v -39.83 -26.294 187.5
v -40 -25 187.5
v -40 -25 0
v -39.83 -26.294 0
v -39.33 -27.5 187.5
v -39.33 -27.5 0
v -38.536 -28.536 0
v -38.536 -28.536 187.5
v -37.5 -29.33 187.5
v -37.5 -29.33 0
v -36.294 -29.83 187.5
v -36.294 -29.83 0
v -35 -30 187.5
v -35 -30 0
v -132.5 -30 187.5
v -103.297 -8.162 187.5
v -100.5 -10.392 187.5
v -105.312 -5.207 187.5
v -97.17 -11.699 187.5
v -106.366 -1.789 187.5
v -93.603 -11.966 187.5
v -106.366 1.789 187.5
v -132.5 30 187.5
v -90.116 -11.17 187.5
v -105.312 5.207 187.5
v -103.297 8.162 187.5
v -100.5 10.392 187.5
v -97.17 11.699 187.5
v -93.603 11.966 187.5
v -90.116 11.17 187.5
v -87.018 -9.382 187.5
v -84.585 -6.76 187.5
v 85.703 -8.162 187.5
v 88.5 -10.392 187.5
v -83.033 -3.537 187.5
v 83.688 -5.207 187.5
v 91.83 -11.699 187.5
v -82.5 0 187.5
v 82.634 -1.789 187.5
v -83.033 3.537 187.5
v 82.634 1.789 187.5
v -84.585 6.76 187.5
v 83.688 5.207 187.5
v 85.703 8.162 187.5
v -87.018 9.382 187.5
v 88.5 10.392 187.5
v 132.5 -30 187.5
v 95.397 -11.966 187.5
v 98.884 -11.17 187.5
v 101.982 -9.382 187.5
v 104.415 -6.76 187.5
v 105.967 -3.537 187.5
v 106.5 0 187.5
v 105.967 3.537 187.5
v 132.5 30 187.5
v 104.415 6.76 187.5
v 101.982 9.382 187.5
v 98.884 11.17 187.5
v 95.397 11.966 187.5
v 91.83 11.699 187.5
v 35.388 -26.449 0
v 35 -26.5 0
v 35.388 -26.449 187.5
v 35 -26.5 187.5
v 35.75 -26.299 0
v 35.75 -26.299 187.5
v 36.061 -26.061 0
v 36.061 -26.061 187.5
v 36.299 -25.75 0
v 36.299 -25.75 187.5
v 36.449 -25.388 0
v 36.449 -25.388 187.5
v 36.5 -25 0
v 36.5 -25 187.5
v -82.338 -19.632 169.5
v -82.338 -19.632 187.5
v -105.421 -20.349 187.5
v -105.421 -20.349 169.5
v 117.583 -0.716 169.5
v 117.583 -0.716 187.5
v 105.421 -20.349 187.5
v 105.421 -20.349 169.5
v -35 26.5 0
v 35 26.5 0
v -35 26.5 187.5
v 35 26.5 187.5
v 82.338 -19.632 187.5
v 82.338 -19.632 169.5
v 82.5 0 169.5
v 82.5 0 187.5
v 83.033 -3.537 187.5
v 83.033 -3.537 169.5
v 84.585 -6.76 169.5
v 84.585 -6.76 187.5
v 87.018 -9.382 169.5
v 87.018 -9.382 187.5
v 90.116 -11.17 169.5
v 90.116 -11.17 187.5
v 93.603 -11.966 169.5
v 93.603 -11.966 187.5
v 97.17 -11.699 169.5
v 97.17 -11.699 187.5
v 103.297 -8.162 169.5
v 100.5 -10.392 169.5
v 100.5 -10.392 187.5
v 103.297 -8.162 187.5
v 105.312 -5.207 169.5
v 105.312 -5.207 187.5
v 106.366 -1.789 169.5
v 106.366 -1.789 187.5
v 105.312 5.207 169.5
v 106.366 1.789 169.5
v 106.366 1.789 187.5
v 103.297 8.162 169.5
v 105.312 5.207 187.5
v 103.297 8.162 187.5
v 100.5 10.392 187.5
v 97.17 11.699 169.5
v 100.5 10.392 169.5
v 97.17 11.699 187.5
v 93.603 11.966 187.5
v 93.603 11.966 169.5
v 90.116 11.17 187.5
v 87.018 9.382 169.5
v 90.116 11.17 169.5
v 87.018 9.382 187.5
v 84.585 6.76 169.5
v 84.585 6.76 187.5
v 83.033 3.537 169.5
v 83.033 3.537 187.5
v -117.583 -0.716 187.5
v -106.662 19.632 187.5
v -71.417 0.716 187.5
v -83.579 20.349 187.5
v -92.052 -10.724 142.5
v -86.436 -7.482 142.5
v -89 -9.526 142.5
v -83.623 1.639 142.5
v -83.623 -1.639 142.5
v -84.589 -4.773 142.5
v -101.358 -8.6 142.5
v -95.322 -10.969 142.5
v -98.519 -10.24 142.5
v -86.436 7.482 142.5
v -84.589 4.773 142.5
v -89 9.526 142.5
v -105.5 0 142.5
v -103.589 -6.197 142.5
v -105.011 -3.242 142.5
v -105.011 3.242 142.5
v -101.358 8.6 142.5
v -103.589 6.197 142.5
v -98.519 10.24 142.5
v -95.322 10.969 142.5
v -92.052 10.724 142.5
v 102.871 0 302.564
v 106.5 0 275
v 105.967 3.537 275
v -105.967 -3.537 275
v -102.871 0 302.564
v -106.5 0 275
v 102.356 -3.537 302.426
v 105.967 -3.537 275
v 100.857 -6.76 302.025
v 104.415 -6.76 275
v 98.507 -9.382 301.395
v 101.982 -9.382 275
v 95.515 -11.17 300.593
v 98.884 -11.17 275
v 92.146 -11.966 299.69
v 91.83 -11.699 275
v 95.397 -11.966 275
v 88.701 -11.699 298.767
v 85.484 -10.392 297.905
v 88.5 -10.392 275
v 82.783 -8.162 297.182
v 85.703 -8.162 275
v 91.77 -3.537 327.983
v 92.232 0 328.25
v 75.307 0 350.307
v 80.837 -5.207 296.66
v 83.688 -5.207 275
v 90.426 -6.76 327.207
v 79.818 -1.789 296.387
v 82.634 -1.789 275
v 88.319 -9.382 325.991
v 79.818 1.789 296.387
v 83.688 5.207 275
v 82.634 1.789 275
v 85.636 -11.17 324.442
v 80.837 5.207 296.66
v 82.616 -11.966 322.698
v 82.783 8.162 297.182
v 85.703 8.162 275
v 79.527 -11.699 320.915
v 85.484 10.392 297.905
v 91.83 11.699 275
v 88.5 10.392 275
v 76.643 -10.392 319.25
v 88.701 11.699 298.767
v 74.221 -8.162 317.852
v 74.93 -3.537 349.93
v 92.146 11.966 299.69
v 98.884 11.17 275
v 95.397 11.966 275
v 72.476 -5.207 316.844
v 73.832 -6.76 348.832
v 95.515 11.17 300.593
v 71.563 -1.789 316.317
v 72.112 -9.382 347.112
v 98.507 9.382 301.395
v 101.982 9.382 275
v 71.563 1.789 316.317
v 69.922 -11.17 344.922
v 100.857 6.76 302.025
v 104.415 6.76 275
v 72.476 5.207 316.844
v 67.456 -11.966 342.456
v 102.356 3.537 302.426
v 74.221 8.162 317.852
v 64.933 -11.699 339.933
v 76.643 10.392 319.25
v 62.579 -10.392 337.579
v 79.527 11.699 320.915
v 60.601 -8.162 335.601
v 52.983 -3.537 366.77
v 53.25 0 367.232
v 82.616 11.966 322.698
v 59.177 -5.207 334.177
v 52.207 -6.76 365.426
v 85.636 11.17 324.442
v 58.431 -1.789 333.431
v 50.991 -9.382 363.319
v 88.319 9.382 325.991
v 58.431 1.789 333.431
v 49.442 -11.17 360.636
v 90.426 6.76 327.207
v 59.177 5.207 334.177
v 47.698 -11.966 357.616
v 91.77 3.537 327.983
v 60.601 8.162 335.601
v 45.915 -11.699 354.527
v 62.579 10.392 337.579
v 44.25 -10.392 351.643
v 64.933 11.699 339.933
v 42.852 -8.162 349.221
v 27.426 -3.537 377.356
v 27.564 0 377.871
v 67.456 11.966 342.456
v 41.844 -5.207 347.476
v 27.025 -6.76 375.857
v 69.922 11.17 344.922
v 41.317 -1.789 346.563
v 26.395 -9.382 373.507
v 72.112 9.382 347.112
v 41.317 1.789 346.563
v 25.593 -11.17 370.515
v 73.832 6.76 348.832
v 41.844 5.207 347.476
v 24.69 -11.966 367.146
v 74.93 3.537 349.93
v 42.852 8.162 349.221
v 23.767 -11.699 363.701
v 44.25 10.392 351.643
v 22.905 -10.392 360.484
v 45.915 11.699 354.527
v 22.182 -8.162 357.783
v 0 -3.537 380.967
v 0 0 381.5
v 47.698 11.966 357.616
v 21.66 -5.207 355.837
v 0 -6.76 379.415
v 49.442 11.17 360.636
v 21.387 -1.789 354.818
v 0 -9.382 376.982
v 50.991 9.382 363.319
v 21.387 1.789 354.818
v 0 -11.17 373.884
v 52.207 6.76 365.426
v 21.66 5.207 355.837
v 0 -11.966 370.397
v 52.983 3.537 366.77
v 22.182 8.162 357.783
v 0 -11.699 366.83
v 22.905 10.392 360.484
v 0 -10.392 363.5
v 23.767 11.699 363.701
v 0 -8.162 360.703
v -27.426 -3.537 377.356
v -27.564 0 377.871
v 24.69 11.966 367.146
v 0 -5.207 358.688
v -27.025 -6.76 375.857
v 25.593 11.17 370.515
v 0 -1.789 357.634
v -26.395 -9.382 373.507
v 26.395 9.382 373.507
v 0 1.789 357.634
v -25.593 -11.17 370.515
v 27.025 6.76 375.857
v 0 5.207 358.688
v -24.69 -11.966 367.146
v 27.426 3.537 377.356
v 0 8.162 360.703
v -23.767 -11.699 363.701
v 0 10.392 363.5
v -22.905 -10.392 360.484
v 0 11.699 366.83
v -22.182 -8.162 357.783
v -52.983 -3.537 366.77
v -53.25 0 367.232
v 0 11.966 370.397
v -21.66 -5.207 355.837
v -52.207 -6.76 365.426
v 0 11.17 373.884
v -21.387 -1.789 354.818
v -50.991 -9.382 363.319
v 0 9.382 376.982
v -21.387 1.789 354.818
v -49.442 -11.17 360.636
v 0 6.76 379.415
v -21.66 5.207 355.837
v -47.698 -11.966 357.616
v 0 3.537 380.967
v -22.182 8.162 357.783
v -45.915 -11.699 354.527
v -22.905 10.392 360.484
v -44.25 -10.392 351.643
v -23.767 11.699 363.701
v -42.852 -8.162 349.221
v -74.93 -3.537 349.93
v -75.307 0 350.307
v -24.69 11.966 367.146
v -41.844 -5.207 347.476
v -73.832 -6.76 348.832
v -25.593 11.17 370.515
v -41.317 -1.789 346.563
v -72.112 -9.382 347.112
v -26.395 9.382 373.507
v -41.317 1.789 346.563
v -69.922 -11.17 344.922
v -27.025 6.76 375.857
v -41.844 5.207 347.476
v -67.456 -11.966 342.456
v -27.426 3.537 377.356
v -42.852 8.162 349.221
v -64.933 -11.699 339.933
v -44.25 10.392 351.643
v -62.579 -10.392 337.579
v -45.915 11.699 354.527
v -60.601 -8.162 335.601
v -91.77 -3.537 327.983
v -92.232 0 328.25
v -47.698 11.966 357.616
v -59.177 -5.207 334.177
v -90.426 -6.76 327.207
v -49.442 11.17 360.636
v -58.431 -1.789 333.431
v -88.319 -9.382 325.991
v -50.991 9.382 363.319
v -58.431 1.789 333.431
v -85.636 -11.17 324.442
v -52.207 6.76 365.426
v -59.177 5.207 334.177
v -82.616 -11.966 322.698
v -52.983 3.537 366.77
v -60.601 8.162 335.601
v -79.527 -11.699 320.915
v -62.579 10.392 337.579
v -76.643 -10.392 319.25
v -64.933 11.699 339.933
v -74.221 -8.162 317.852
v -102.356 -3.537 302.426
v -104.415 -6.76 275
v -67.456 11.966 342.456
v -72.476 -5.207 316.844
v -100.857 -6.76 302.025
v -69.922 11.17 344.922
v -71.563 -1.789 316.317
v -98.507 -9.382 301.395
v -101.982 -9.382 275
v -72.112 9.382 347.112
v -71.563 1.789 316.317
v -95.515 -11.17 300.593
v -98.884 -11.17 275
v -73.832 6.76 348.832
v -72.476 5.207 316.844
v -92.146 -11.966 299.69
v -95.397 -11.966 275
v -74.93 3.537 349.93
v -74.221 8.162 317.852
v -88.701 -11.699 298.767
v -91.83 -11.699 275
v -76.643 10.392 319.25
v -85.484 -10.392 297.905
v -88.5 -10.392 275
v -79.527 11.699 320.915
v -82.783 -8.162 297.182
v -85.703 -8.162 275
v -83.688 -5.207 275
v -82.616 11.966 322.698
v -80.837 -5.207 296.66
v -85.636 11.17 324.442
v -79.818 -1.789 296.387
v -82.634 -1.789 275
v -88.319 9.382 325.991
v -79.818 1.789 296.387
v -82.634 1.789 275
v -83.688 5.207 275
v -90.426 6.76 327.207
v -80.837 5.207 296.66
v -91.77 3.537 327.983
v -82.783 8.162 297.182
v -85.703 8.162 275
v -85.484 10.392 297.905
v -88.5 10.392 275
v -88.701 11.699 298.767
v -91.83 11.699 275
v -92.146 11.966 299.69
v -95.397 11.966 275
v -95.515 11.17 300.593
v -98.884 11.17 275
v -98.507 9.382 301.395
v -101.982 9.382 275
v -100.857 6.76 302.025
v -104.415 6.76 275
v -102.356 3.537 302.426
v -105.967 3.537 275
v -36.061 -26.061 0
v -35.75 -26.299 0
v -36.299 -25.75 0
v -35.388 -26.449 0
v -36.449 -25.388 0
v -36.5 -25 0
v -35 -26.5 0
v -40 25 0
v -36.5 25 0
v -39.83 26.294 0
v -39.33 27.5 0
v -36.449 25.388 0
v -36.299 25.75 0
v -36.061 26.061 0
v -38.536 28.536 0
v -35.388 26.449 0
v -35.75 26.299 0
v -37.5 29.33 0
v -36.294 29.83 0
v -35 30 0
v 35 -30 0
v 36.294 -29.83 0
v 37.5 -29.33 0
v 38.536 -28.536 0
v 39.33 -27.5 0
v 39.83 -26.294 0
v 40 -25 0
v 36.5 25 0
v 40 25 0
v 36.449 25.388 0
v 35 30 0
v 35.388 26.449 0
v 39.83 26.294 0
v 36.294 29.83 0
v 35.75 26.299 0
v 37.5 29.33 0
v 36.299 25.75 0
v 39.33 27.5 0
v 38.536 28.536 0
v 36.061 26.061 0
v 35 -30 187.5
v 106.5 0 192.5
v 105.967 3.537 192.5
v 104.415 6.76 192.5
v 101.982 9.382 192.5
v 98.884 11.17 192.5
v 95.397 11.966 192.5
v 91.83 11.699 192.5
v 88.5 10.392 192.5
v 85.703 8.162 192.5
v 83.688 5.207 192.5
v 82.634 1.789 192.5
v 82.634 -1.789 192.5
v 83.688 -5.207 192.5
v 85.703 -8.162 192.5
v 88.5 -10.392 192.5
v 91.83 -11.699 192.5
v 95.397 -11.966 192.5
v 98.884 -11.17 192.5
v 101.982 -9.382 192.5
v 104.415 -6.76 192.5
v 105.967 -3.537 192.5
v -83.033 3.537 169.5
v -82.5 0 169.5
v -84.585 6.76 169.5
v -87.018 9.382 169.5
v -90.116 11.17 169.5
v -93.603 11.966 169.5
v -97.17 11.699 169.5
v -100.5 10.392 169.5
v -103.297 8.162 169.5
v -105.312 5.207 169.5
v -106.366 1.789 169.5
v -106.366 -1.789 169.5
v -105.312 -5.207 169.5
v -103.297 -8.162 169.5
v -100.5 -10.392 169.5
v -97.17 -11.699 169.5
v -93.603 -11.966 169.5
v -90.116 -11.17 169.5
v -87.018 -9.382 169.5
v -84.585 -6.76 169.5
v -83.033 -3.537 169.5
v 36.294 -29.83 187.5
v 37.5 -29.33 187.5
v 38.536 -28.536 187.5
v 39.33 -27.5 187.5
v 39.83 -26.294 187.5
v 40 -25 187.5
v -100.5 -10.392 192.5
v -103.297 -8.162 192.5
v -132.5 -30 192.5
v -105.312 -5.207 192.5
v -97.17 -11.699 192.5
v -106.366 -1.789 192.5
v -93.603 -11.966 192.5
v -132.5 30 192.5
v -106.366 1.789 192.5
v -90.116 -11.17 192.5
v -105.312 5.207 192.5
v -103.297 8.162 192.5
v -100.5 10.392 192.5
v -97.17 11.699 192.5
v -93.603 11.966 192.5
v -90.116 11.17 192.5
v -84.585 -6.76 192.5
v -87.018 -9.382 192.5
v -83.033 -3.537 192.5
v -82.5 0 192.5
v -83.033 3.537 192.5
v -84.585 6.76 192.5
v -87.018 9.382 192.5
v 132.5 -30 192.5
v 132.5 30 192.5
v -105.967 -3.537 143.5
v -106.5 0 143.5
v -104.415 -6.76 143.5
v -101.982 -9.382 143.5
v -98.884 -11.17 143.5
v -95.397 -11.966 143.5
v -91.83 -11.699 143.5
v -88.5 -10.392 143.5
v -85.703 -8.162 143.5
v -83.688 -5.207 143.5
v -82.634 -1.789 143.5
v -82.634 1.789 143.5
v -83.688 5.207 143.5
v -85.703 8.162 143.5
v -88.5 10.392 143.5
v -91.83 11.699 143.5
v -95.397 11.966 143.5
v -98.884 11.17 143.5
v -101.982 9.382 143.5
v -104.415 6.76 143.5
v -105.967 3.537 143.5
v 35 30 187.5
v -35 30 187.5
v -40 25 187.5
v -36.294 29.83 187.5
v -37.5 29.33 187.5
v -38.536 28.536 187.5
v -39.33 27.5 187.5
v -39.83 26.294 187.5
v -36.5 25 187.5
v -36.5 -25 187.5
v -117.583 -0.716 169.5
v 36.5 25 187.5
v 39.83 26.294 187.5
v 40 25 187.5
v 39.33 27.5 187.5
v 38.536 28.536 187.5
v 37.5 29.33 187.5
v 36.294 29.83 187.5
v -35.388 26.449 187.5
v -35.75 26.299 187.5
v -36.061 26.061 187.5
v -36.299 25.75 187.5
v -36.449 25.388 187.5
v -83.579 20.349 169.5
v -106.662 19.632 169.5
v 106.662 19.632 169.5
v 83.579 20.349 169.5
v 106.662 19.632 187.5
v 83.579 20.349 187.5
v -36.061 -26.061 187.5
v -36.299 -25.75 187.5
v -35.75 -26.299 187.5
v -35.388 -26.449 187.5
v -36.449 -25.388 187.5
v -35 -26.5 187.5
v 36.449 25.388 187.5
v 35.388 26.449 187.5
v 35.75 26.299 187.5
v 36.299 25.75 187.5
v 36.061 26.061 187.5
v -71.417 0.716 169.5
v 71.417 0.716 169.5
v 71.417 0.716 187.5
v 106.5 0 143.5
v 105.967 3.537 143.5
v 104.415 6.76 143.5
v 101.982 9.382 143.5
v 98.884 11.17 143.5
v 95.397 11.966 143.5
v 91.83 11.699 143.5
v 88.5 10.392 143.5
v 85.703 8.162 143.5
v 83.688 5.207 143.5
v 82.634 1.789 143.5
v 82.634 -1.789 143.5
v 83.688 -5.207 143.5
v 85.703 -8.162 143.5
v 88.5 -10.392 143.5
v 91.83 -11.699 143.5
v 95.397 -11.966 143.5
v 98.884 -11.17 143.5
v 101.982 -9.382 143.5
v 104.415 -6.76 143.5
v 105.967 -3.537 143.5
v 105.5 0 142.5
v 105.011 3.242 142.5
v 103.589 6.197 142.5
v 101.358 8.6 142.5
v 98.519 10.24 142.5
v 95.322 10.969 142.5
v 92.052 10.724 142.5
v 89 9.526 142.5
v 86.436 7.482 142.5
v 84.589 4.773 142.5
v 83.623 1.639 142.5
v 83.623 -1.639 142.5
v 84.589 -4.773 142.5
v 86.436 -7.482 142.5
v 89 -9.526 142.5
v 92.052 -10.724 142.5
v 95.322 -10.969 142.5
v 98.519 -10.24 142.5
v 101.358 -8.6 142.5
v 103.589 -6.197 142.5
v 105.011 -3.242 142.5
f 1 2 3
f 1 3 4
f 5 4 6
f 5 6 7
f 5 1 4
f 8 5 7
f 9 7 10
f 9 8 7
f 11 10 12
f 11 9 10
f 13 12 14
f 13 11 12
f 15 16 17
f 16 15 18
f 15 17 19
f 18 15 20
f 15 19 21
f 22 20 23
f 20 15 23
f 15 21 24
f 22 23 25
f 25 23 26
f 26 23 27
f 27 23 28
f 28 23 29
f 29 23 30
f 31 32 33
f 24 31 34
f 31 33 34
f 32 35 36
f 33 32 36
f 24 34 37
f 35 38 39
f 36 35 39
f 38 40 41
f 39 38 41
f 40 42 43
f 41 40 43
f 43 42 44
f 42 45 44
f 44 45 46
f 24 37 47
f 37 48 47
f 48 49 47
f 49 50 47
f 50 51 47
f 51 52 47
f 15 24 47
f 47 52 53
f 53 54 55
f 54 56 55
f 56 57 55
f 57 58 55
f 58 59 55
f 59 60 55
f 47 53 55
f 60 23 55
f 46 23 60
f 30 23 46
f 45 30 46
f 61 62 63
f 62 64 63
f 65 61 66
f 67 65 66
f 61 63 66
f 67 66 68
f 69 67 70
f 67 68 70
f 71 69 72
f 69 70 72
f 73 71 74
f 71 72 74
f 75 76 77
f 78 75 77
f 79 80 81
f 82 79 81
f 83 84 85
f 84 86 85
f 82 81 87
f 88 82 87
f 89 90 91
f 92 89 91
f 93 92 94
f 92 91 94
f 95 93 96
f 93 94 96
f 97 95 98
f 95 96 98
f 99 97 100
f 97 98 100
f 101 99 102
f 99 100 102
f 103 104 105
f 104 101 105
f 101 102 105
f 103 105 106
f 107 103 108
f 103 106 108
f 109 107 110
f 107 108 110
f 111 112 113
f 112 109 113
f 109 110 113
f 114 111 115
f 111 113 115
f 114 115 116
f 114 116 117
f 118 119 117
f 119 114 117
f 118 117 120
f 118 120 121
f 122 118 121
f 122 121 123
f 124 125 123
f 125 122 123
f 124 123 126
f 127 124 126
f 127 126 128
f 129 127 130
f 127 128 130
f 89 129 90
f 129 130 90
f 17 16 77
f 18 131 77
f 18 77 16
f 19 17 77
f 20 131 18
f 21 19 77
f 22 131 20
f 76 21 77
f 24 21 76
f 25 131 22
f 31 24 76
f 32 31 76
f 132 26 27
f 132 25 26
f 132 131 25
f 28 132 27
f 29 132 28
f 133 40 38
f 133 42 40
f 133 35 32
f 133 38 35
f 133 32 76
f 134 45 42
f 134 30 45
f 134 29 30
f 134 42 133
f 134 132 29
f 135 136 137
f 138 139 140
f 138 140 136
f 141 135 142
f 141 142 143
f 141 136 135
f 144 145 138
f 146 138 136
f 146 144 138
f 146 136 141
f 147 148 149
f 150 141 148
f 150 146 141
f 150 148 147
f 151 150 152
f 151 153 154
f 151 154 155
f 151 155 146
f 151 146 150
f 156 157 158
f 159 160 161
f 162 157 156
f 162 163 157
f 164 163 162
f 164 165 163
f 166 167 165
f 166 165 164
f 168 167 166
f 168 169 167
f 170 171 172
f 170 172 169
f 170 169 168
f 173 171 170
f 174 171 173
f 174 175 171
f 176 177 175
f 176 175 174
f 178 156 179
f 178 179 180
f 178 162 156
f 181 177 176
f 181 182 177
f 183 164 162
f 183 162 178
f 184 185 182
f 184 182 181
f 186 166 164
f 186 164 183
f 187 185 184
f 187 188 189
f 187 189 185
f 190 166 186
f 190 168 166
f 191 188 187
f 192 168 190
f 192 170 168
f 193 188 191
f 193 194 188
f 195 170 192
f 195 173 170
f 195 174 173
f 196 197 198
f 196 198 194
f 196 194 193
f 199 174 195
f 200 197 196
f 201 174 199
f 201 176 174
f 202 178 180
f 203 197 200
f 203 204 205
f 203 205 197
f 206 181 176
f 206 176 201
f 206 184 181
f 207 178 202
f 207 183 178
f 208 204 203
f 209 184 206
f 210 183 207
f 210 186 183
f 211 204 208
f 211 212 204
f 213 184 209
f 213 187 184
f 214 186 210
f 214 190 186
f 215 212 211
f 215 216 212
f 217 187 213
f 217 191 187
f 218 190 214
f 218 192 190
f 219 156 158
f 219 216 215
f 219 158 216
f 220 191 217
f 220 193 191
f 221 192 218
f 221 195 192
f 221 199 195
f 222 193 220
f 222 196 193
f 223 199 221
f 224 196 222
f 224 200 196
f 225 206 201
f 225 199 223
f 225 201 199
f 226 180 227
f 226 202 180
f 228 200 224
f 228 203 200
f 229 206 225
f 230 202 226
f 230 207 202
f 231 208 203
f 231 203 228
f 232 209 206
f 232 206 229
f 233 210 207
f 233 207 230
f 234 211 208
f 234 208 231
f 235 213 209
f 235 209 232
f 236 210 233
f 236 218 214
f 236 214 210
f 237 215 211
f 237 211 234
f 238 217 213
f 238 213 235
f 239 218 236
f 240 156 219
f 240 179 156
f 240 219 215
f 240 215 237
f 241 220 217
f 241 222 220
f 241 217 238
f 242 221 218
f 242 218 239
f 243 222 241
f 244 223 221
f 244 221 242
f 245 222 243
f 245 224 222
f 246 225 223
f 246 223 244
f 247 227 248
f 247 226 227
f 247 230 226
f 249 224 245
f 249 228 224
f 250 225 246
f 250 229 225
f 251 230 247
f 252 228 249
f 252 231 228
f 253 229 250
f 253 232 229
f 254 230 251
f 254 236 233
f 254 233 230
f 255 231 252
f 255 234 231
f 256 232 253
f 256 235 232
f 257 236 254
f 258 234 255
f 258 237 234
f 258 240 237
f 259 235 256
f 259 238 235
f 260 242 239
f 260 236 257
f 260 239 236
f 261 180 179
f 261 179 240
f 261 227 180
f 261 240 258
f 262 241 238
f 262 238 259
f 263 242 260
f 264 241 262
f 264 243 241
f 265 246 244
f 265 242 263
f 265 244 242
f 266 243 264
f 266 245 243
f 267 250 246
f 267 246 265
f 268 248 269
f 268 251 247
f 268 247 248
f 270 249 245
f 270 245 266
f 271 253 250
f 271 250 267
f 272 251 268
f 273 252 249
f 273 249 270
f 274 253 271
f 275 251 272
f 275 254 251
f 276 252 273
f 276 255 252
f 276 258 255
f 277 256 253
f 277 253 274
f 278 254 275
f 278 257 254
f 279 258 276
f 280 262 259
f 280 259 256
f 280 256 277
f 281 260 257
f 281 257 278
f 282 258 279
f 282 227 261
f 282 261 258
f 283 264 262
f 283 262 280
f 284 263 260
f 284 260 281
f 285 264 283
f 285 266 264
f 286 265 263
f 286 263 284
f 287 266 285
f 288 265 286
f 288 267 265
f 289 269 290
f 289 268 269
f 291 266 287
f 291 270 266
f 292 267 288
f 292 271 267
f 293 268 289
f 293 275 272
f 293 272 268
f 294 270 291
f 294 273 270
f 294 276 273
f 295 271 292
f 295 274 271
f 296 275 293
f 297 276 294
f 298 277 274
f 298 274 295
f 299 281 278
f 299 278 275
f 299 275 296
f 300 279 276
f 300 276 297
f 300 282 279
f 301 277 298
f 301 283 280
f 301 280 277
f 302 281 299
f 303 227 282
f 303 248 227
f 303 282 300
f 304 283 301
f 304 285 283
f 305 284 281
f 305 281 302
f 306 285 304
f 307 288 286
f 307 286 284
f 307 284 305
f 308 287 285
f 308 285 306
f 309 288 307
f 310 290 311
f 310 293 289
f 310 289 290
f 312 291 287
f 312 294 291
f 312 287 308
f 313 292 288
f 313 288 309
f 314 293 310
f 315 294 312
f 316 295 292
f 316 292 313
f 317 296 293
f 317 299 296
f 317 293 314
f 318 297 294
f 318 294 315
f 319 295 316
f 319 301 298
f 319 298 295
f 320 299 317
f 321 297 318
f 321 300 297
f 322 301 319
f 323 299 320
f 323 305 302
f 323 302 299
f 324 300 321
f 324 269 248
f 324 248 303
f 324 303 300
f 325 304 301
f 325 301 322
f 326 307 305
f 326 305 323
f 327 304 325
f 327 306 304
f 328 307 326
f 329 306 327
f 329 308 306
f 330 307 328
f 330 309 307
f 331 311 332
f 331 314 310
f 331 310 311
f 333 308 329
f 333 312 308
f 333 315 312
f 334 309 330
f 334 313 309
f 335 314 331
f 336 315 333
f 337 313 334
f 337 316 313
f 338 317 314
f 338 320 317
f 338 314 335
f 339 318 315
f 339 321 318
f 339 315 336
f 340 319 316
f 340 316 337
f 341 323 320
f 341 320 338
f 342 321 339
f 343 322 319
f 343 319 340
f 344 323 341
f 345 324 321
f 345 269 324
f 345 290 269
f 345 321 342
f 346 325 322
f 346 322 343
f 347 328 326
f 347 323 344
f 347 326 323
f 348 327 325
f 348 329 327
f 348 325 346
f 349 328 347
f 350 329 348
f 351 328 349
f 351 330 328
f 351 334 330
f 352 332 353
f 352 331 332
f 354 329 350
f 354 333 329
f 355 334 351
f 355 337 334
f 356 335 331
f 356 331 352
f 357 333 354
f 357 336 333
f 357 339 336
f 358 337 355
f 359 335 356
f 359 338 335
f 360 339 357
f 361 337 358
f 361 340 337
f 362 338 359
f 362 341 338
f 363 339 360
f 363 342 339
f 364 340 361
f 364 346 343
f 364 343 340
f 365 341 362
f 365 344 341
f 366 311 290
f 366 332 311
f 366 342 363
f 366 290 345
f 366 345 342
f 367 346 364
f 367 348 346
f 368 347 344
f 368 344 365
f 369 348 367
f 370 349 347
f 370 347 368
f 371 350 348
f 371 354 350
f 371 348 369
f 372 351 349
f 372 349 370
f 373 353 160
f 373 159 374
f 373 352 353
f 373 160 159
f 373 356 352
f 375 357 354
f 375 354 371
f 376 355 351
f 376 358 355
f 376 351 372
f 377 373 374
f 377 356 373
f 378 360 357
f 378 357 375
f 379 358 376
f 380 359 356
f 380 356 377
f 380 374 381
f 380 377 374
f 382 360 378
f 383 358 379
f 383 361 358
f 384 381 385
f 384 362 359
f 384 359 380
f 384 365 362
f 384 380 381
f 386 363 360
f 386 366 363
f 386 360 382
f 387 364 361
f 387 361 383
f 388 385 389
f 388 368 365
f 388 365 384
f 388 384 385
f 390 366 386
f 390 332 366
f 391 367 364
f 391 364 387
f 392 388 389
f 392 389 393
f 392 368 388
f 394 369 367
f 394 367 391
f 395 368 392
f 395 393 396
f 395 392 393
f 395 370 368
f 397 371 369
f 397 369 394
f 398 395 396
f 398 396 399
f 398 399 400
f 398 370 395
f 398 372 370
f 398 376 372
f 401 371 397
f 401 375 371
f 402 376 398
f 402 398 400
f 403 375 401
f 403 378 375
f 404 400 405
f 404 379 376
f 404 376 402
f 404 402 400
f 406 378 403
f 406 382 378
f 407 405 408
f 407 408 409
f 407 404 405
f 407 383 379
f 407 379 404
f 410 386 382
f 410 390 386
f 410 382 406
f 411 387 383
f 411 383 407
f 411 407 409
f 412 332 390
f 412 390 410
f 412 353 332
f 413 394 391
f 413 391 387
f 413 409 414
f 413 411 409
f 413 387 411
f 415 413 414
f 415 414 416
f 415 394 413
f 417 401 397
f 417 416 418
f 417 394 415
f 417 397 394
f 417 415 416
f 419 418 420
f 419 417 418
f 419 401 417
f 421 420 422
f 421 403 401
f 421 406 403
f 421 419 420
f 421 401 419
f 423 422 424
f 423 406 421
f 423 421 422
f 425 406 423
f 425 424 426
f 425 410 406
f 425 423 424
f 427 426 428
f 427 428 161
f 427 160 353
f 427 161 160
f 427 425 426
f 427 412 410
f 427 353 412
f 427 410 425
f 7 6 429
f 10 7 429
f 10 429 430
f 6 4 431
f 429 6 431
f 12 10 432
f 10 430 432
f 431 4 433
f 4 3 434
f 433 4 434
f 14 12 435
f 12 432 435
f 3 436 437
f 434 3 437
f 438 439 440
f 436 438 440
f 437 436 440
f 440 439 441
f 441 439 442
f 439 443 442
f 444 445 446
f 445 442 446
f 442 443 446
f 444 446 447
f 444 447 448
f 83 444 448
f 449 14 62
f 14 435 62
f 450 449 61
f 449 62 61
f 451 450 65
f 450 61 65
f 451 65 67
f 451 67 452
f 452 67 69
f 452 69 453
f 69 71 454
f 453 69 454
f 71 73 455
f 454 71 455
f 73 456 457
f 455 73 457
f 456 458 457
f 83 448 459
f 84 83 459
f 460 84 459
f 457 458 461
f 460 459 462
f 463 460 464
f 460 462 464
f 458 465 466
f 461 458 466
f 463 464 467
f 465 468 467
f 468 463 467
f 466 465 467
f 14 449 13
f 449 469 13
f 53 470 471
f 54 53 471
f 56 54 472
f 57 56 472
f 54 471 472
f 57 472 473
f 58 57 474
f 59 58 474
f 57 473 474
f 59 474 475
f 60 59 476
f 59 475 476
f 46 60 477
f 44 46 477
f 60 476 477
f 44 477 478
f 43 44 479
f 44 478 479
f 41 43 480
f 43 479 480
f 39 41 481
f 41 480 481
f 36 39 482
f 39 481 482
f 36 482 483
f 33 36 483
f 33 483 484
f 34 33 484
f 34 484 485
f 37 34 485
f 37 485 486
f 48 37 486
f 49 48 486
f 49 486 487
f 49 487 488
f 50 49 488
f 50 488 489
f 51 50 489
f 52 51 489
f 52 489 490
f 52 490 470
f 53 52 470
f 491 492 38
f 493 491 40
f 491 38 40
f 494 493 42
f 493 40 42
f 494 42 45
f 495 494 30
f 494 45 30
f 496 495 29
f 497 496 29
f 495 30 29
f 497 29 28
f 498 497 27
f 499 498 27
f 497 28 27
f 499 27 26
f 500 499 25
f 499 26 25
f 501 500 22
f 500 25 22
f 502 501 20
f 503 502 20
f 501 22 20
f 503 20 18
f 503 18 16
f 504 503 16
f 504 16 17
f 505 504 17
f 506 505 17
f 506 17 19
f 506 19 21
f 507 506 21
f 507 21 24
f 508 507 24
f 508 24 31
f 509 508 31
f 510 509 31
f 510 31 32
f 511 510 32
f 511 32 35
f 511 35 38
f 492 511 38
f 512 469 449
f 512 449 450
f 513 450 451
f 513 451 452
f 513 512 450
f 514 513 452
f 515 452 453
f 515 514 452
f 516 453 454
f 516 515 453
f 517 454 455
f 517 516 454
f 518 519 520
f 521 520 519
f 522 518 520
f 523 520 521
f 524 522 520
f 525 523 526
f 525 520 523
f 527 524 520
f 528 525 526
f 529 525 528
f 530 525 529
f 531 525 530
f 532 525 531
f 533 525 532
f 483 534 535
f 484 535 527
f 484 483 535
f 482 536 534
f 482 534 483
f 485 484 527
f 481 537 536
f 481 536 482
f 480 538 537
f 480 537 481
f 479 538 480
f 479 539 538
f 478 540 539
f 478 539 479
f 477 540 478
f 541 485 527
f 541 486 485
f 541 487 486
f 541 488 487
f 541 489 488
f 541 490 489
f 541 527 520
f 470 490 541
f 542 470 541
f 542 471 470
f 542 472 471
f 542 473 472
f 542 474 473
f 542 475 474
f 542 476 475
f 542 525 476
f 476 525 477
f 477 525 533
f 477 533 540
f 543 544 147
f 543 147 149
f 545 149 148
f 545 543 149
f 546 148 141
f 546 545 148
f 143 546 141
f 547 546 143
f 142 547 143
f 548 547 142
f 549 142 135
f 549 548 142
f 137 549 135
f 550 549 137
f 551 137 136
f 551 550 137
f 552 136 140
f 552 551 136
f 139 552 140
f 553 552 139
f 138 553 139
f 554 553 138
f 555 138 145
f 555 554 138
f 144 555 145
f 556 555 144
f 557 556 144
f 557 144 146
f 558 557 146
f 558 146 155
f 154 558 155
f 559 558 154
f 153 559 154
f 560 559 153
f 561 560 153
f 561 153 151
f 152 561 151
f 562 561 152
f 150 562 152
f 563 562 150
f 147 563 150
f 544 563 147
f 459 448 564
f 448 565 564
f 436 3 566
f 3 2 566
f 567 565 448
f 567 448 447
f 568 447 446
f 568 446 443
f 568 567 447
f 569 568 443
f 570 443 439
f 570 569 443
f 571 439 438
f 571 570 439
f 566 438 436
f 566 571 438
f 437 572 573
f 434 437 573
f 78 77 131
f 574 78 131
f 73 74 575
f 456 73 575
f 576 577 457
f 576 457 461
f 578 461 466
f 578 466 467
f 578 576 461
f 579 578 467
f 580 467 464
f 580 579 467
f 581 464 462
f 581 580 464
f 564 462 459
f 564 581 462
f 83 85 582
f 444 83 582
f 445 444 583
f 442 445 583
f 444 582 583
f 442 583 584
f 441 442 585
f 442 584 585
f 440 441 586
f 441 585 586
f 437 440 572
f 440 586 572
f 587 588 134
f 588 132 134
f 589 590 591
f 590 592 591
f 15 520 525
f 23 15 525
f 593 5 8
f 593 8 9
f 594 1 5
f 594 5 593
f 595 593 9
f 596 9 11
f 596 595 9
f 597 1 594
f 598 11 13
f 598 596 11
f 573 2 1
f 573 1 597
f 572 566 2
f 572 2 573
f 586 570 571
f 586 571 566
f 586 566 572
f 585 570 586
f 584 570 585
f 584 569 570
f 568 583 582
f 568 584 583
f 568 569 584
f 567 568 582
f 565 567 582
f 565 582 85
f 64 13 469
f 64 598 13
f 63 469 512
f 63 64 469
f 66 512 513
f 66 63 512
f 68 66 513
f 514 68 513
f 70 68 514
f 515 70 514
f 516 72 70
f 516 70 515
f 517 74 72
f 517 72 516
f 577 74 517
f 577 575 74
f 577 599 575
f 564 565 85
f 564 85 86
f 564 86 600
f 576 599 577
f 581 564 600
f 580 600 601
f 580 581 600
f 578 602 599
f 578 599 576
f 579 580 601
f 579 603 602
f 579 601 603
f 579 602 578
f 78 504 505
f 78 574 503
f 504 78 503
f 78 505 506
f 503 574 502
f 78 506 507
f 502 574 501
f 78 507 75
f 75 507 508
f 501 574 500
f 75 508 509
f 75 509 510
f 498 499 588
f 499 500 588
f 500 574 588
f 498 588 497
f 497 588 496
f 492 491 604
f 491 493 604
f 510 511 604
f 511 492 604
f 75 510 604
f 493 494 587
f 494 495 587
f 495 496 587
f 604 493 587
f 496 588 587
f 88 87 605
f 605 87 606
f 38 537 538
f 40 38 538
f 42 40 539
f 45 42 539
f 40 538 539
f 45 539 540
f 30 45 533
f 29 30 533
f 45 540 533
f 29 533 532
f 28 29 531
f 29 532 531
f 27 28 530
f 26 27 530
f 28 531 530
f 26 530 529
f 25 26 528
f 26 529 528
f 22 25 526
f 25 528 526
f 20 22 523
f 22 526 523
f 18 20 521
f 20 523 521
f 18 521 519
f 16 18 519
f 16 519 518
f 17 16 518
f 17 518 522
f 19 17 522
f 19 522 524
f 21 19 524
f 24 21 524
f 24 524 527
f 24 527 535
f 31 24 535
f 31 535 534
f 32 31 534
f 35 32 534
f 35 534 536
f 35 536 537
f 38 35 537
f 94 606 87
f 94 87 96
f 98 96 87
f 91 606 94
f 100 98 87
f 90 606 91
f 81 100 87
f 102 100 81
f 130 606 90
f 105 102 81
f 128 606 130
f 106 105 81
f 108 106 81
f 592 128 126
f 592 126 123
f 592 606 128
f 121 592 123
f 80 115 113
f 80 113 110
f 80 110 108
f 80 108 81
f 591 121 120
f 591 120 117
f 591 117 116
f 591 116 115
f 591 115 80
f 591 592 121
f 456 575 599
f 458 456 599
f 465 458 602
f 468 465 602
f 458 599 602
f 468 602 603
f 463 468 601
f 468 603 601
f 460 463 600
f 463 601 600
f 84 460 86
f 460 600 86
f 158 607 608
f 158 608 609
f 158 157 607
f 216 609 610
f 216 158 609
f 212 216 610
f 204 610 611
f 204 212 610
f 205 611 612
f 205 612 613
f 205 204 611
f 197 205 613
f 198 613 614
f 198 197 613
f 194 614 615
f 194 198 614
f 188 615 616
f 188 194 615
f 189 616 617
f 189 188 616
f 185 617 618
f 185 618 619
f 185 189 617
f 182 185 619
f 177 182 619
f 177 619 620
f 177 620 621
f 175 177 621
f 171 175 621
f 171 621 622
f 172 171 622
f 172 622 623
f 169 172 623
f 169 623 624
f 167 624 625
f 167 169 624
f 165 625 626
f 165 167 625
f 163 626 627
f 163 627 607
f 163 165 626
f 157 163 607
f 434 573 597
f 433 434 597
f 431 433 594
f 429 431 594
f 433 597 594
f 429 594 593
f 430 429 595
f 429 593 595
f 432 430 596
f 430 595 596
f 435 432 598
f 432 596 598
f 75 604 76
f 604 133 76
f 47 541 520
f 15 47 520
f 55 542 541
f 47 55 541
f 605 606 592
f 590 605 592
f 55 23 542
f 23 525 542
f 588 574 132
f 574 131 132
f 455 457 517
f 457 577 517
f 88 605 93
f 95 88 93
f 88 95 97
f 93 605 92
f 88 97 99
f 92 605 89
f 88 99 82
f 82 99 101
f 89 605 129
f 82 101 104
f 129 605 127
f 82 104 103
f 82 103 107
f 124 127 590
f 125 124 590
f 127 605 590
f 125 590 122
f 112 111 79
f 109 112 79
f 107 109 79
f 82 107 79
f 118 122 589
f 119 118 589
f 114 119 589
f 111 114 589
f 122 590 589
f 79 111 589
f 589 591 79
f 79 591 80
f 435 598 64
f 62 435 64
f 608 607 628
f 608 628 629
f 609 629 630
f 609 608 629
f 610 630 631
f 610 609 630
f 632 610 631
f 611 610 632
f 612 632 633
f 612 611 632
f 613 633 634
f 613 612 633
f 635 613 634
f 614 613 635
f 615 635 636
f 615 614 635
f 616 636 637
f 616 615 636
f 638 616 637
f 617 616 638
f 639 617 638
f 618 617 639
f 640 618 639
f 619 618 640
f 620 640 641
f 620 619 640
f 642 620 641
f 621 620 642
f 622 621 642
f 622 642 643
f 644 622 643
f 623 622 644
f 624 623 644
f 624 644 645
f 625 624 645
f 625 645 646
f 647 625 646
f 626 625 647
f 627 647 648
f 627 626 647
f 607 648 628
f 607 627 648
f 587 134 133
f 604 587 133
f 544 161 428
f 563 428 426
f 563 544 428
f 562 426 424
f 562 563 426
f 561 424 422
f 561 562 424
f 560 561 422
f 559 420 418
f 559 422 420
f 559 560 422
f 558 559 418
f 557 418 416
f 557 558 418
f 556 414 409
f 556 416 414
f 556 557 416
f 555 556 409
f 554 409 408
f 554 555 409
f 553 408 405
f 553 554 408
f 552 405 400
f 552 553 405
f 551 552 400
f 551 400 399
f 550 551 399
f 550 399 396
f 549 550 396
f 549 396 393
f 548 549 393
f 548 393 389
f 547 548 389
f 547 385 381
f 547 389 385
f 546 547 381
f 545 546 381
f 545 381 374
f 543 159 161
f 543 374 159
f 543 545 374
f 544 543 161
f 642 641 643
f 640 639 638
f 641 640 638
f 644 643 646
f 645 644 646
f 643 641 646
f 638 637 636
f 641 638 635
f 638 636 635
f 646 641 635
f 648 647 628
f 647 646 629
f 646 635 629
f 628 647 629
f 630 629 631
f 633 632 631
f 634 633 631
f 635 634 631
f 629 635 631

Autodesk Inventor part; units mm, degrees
ref_plane "YZ Plane" through (0, 0, 0) normal (1, 0, 0) x (0, 1, 0)
sketch "Sketch1" plane through (0, 0, 0) normal (0, 1, 0) x (-1, 0, 0)
  arc A0 (-82.5, 275) -> (82.5, 275) centre (0, 275) ccw construction
  line L0 (82.5, 192.5) -> (-82.5, 192.5) construction
  line L1 (82.5, 275) -> (82.5, 142.5)
  line L2 (-82.5, 275) -> (-82.5, 142.5)
  arc A1 (82.5, 275) -> (-82.5, 275) centre (0, 275) ccw
  line L3 (82.5, 142.5) -> (-82.5, 142.5) construction
  point P0 (0, 0)
  dimension "Thread" = 50
  dimension "d13" = 275
ref_plane "Work Plane1" through (-82.5, 0, 142.5) normal (0, 0, -1) x (-1, 0, 0)
sketch "Sketch2" plane through (-82.5, 0, 142.5) normal (0, 0, -1) x (-1, 0, 0)
  circle A0 centre (12, 0) radius 12
  point P0 (-82.5, 0)
  point P1 (0, 0)
  dimension "d2" = 24
sweep "Sweep1" add profiles "Sketch2" path "Sketch1"
thread "Thread1"
thread "Thread2"
chamfer "Chamfer1" distance 1 angle 45 4 edges at (82.5, 0, 142.5) (82.5, 0, 275) (-82.5, 0, 275) (-82.5, 0, 142.5)
ref_plane "Work Plane3" through (-82.5, 0, 192.5) normal (0, 0, 1) x (1, 0, 0)
sketch "Sketch3" plane through (-82.5, 0, 192.5) normal (0, 0, 1) x (1, 0, 0)
  line L0 (215, -30) -> (-50, -30)
  line L1 (-50, -30) -> (-50, 30)
  line L2 (-50, 30) -> (215, 30)
  line L3 (215, 30) -> (215, -30)
  line L4 (215, -30) -> (-50, 30) construction
  line L5 (-50, -30) -> (215, 30) construction
  circle A0 centre (-12, 0) radius 12 projected
  circle A1 centre (177, 0) radius 12 projected
  line L6 (117.5, -30) -> (47.5, -30)
  line L7 (42.5, -25) -> (42.5, 25)
  line L8 (47.5, 30) -> (117.5, 30)
  line L9 (122.5, 25) -> (122.5, -25)
  line L10 (122.5, -30) -> (42.5, 30) construction
  line L11 (42.5, -30) -> (122.5, 30) construction
  arc A2 (42.5, -25) -> (47.5, -30) centre (47.5, -25) ccw
  arc A3 (47.5, 30) -> (42.5, 25) centre (47.5, 25) ccw
  arc A4 (122.5, 25) -> (117.5, 30) centre (117.5, 25) ccw
  arc A5 (117.5, -30) -> (122.5, -25) centre (117.5, -25) ccw
  line L12 (46, 25) -> (46, -25)
  arc A6 (46, -25) -> (47.5, -26.5) centre (47.5, -25) ccw
  line L13 (47.5, -26.5) -> (117.5, -26.5)
  arc A7 (117.5, -26.5) -> (119, -25) centre (117.5, -25) ccw
  line L14 (119, -25) -> (119, 25)
  arc A8 (119, 25) -> (117.5, 26.5) centre (117.5, 25) ccw
  line L15 (117.5, 26.5) -> (47.5, 26.5)
  arc A9 (47.5, 26.5) -> (46, 25) centre (47.5, 25) ccw
  line L16 (0.1619, -19.6321) -> (-22.921, -20.3486)
  line L17 (-22.921, -20.3486) -> (-35.0829, -0.7165)
  line L18 (-35.0829, -0.7165) -> (-24.1619, 19.6321)
  line L19 (-24.1619, 19.6321) -> (-1.079, 20.3486)
  line L20 (-1.079, 20.3486) -> (11.0829, 0.7165)
  line L21 (11.0829, 0.7165) -> (0.1619, -19.6321)
  point P0 (82.5, 0)
  point P1 (-12, 0)
  dimension "d15" = 265
  dimension "d16" = 60
  dimension "d21" = 80
  dimension "d22" = 60
  dimension "d23" = 5
  dimension "d24" = 3.5
  dimension "d27" = 40
extrude "Extrusion1" add sketch "Sketch3" against normal blind 5 separate body contours L0 A5 L9 A4 L2 L3 | L0 A2 L7 A3 L2 A4 L9 A5 | L0 L1 L2 A3 L7 A2 | A0 | A1 | A9 L15 A8 L14 A7 L13 A6 L12 | L16 L17 L18 L19 L20 L21
extrude "Extrusion2" cut sketch "Sketch3" against normal through all contours A0 | A1 bodies 2
extrude "Extrusion3" add sketch "Sketch3" against normal up to surface (187.5 mm away) from surface at -5 separate body contours L0 A2 L7 A3 L2 A4 L9 A5
extrude "Extrusion4" add sketch "Sketch3" against normal blind 18 from surface at -5 separate body contours L16 L17 L18 L19 L20 L21
mirror "Mirror1" about plane through (0, 0, 0) normal (1, 0, 0) bodies 4
equation "\"d4\" = Thread"
equation "\"d6\" = Thread"
properties part number "Pipe Support Valve U-Ring" material "Stainless Steel"
